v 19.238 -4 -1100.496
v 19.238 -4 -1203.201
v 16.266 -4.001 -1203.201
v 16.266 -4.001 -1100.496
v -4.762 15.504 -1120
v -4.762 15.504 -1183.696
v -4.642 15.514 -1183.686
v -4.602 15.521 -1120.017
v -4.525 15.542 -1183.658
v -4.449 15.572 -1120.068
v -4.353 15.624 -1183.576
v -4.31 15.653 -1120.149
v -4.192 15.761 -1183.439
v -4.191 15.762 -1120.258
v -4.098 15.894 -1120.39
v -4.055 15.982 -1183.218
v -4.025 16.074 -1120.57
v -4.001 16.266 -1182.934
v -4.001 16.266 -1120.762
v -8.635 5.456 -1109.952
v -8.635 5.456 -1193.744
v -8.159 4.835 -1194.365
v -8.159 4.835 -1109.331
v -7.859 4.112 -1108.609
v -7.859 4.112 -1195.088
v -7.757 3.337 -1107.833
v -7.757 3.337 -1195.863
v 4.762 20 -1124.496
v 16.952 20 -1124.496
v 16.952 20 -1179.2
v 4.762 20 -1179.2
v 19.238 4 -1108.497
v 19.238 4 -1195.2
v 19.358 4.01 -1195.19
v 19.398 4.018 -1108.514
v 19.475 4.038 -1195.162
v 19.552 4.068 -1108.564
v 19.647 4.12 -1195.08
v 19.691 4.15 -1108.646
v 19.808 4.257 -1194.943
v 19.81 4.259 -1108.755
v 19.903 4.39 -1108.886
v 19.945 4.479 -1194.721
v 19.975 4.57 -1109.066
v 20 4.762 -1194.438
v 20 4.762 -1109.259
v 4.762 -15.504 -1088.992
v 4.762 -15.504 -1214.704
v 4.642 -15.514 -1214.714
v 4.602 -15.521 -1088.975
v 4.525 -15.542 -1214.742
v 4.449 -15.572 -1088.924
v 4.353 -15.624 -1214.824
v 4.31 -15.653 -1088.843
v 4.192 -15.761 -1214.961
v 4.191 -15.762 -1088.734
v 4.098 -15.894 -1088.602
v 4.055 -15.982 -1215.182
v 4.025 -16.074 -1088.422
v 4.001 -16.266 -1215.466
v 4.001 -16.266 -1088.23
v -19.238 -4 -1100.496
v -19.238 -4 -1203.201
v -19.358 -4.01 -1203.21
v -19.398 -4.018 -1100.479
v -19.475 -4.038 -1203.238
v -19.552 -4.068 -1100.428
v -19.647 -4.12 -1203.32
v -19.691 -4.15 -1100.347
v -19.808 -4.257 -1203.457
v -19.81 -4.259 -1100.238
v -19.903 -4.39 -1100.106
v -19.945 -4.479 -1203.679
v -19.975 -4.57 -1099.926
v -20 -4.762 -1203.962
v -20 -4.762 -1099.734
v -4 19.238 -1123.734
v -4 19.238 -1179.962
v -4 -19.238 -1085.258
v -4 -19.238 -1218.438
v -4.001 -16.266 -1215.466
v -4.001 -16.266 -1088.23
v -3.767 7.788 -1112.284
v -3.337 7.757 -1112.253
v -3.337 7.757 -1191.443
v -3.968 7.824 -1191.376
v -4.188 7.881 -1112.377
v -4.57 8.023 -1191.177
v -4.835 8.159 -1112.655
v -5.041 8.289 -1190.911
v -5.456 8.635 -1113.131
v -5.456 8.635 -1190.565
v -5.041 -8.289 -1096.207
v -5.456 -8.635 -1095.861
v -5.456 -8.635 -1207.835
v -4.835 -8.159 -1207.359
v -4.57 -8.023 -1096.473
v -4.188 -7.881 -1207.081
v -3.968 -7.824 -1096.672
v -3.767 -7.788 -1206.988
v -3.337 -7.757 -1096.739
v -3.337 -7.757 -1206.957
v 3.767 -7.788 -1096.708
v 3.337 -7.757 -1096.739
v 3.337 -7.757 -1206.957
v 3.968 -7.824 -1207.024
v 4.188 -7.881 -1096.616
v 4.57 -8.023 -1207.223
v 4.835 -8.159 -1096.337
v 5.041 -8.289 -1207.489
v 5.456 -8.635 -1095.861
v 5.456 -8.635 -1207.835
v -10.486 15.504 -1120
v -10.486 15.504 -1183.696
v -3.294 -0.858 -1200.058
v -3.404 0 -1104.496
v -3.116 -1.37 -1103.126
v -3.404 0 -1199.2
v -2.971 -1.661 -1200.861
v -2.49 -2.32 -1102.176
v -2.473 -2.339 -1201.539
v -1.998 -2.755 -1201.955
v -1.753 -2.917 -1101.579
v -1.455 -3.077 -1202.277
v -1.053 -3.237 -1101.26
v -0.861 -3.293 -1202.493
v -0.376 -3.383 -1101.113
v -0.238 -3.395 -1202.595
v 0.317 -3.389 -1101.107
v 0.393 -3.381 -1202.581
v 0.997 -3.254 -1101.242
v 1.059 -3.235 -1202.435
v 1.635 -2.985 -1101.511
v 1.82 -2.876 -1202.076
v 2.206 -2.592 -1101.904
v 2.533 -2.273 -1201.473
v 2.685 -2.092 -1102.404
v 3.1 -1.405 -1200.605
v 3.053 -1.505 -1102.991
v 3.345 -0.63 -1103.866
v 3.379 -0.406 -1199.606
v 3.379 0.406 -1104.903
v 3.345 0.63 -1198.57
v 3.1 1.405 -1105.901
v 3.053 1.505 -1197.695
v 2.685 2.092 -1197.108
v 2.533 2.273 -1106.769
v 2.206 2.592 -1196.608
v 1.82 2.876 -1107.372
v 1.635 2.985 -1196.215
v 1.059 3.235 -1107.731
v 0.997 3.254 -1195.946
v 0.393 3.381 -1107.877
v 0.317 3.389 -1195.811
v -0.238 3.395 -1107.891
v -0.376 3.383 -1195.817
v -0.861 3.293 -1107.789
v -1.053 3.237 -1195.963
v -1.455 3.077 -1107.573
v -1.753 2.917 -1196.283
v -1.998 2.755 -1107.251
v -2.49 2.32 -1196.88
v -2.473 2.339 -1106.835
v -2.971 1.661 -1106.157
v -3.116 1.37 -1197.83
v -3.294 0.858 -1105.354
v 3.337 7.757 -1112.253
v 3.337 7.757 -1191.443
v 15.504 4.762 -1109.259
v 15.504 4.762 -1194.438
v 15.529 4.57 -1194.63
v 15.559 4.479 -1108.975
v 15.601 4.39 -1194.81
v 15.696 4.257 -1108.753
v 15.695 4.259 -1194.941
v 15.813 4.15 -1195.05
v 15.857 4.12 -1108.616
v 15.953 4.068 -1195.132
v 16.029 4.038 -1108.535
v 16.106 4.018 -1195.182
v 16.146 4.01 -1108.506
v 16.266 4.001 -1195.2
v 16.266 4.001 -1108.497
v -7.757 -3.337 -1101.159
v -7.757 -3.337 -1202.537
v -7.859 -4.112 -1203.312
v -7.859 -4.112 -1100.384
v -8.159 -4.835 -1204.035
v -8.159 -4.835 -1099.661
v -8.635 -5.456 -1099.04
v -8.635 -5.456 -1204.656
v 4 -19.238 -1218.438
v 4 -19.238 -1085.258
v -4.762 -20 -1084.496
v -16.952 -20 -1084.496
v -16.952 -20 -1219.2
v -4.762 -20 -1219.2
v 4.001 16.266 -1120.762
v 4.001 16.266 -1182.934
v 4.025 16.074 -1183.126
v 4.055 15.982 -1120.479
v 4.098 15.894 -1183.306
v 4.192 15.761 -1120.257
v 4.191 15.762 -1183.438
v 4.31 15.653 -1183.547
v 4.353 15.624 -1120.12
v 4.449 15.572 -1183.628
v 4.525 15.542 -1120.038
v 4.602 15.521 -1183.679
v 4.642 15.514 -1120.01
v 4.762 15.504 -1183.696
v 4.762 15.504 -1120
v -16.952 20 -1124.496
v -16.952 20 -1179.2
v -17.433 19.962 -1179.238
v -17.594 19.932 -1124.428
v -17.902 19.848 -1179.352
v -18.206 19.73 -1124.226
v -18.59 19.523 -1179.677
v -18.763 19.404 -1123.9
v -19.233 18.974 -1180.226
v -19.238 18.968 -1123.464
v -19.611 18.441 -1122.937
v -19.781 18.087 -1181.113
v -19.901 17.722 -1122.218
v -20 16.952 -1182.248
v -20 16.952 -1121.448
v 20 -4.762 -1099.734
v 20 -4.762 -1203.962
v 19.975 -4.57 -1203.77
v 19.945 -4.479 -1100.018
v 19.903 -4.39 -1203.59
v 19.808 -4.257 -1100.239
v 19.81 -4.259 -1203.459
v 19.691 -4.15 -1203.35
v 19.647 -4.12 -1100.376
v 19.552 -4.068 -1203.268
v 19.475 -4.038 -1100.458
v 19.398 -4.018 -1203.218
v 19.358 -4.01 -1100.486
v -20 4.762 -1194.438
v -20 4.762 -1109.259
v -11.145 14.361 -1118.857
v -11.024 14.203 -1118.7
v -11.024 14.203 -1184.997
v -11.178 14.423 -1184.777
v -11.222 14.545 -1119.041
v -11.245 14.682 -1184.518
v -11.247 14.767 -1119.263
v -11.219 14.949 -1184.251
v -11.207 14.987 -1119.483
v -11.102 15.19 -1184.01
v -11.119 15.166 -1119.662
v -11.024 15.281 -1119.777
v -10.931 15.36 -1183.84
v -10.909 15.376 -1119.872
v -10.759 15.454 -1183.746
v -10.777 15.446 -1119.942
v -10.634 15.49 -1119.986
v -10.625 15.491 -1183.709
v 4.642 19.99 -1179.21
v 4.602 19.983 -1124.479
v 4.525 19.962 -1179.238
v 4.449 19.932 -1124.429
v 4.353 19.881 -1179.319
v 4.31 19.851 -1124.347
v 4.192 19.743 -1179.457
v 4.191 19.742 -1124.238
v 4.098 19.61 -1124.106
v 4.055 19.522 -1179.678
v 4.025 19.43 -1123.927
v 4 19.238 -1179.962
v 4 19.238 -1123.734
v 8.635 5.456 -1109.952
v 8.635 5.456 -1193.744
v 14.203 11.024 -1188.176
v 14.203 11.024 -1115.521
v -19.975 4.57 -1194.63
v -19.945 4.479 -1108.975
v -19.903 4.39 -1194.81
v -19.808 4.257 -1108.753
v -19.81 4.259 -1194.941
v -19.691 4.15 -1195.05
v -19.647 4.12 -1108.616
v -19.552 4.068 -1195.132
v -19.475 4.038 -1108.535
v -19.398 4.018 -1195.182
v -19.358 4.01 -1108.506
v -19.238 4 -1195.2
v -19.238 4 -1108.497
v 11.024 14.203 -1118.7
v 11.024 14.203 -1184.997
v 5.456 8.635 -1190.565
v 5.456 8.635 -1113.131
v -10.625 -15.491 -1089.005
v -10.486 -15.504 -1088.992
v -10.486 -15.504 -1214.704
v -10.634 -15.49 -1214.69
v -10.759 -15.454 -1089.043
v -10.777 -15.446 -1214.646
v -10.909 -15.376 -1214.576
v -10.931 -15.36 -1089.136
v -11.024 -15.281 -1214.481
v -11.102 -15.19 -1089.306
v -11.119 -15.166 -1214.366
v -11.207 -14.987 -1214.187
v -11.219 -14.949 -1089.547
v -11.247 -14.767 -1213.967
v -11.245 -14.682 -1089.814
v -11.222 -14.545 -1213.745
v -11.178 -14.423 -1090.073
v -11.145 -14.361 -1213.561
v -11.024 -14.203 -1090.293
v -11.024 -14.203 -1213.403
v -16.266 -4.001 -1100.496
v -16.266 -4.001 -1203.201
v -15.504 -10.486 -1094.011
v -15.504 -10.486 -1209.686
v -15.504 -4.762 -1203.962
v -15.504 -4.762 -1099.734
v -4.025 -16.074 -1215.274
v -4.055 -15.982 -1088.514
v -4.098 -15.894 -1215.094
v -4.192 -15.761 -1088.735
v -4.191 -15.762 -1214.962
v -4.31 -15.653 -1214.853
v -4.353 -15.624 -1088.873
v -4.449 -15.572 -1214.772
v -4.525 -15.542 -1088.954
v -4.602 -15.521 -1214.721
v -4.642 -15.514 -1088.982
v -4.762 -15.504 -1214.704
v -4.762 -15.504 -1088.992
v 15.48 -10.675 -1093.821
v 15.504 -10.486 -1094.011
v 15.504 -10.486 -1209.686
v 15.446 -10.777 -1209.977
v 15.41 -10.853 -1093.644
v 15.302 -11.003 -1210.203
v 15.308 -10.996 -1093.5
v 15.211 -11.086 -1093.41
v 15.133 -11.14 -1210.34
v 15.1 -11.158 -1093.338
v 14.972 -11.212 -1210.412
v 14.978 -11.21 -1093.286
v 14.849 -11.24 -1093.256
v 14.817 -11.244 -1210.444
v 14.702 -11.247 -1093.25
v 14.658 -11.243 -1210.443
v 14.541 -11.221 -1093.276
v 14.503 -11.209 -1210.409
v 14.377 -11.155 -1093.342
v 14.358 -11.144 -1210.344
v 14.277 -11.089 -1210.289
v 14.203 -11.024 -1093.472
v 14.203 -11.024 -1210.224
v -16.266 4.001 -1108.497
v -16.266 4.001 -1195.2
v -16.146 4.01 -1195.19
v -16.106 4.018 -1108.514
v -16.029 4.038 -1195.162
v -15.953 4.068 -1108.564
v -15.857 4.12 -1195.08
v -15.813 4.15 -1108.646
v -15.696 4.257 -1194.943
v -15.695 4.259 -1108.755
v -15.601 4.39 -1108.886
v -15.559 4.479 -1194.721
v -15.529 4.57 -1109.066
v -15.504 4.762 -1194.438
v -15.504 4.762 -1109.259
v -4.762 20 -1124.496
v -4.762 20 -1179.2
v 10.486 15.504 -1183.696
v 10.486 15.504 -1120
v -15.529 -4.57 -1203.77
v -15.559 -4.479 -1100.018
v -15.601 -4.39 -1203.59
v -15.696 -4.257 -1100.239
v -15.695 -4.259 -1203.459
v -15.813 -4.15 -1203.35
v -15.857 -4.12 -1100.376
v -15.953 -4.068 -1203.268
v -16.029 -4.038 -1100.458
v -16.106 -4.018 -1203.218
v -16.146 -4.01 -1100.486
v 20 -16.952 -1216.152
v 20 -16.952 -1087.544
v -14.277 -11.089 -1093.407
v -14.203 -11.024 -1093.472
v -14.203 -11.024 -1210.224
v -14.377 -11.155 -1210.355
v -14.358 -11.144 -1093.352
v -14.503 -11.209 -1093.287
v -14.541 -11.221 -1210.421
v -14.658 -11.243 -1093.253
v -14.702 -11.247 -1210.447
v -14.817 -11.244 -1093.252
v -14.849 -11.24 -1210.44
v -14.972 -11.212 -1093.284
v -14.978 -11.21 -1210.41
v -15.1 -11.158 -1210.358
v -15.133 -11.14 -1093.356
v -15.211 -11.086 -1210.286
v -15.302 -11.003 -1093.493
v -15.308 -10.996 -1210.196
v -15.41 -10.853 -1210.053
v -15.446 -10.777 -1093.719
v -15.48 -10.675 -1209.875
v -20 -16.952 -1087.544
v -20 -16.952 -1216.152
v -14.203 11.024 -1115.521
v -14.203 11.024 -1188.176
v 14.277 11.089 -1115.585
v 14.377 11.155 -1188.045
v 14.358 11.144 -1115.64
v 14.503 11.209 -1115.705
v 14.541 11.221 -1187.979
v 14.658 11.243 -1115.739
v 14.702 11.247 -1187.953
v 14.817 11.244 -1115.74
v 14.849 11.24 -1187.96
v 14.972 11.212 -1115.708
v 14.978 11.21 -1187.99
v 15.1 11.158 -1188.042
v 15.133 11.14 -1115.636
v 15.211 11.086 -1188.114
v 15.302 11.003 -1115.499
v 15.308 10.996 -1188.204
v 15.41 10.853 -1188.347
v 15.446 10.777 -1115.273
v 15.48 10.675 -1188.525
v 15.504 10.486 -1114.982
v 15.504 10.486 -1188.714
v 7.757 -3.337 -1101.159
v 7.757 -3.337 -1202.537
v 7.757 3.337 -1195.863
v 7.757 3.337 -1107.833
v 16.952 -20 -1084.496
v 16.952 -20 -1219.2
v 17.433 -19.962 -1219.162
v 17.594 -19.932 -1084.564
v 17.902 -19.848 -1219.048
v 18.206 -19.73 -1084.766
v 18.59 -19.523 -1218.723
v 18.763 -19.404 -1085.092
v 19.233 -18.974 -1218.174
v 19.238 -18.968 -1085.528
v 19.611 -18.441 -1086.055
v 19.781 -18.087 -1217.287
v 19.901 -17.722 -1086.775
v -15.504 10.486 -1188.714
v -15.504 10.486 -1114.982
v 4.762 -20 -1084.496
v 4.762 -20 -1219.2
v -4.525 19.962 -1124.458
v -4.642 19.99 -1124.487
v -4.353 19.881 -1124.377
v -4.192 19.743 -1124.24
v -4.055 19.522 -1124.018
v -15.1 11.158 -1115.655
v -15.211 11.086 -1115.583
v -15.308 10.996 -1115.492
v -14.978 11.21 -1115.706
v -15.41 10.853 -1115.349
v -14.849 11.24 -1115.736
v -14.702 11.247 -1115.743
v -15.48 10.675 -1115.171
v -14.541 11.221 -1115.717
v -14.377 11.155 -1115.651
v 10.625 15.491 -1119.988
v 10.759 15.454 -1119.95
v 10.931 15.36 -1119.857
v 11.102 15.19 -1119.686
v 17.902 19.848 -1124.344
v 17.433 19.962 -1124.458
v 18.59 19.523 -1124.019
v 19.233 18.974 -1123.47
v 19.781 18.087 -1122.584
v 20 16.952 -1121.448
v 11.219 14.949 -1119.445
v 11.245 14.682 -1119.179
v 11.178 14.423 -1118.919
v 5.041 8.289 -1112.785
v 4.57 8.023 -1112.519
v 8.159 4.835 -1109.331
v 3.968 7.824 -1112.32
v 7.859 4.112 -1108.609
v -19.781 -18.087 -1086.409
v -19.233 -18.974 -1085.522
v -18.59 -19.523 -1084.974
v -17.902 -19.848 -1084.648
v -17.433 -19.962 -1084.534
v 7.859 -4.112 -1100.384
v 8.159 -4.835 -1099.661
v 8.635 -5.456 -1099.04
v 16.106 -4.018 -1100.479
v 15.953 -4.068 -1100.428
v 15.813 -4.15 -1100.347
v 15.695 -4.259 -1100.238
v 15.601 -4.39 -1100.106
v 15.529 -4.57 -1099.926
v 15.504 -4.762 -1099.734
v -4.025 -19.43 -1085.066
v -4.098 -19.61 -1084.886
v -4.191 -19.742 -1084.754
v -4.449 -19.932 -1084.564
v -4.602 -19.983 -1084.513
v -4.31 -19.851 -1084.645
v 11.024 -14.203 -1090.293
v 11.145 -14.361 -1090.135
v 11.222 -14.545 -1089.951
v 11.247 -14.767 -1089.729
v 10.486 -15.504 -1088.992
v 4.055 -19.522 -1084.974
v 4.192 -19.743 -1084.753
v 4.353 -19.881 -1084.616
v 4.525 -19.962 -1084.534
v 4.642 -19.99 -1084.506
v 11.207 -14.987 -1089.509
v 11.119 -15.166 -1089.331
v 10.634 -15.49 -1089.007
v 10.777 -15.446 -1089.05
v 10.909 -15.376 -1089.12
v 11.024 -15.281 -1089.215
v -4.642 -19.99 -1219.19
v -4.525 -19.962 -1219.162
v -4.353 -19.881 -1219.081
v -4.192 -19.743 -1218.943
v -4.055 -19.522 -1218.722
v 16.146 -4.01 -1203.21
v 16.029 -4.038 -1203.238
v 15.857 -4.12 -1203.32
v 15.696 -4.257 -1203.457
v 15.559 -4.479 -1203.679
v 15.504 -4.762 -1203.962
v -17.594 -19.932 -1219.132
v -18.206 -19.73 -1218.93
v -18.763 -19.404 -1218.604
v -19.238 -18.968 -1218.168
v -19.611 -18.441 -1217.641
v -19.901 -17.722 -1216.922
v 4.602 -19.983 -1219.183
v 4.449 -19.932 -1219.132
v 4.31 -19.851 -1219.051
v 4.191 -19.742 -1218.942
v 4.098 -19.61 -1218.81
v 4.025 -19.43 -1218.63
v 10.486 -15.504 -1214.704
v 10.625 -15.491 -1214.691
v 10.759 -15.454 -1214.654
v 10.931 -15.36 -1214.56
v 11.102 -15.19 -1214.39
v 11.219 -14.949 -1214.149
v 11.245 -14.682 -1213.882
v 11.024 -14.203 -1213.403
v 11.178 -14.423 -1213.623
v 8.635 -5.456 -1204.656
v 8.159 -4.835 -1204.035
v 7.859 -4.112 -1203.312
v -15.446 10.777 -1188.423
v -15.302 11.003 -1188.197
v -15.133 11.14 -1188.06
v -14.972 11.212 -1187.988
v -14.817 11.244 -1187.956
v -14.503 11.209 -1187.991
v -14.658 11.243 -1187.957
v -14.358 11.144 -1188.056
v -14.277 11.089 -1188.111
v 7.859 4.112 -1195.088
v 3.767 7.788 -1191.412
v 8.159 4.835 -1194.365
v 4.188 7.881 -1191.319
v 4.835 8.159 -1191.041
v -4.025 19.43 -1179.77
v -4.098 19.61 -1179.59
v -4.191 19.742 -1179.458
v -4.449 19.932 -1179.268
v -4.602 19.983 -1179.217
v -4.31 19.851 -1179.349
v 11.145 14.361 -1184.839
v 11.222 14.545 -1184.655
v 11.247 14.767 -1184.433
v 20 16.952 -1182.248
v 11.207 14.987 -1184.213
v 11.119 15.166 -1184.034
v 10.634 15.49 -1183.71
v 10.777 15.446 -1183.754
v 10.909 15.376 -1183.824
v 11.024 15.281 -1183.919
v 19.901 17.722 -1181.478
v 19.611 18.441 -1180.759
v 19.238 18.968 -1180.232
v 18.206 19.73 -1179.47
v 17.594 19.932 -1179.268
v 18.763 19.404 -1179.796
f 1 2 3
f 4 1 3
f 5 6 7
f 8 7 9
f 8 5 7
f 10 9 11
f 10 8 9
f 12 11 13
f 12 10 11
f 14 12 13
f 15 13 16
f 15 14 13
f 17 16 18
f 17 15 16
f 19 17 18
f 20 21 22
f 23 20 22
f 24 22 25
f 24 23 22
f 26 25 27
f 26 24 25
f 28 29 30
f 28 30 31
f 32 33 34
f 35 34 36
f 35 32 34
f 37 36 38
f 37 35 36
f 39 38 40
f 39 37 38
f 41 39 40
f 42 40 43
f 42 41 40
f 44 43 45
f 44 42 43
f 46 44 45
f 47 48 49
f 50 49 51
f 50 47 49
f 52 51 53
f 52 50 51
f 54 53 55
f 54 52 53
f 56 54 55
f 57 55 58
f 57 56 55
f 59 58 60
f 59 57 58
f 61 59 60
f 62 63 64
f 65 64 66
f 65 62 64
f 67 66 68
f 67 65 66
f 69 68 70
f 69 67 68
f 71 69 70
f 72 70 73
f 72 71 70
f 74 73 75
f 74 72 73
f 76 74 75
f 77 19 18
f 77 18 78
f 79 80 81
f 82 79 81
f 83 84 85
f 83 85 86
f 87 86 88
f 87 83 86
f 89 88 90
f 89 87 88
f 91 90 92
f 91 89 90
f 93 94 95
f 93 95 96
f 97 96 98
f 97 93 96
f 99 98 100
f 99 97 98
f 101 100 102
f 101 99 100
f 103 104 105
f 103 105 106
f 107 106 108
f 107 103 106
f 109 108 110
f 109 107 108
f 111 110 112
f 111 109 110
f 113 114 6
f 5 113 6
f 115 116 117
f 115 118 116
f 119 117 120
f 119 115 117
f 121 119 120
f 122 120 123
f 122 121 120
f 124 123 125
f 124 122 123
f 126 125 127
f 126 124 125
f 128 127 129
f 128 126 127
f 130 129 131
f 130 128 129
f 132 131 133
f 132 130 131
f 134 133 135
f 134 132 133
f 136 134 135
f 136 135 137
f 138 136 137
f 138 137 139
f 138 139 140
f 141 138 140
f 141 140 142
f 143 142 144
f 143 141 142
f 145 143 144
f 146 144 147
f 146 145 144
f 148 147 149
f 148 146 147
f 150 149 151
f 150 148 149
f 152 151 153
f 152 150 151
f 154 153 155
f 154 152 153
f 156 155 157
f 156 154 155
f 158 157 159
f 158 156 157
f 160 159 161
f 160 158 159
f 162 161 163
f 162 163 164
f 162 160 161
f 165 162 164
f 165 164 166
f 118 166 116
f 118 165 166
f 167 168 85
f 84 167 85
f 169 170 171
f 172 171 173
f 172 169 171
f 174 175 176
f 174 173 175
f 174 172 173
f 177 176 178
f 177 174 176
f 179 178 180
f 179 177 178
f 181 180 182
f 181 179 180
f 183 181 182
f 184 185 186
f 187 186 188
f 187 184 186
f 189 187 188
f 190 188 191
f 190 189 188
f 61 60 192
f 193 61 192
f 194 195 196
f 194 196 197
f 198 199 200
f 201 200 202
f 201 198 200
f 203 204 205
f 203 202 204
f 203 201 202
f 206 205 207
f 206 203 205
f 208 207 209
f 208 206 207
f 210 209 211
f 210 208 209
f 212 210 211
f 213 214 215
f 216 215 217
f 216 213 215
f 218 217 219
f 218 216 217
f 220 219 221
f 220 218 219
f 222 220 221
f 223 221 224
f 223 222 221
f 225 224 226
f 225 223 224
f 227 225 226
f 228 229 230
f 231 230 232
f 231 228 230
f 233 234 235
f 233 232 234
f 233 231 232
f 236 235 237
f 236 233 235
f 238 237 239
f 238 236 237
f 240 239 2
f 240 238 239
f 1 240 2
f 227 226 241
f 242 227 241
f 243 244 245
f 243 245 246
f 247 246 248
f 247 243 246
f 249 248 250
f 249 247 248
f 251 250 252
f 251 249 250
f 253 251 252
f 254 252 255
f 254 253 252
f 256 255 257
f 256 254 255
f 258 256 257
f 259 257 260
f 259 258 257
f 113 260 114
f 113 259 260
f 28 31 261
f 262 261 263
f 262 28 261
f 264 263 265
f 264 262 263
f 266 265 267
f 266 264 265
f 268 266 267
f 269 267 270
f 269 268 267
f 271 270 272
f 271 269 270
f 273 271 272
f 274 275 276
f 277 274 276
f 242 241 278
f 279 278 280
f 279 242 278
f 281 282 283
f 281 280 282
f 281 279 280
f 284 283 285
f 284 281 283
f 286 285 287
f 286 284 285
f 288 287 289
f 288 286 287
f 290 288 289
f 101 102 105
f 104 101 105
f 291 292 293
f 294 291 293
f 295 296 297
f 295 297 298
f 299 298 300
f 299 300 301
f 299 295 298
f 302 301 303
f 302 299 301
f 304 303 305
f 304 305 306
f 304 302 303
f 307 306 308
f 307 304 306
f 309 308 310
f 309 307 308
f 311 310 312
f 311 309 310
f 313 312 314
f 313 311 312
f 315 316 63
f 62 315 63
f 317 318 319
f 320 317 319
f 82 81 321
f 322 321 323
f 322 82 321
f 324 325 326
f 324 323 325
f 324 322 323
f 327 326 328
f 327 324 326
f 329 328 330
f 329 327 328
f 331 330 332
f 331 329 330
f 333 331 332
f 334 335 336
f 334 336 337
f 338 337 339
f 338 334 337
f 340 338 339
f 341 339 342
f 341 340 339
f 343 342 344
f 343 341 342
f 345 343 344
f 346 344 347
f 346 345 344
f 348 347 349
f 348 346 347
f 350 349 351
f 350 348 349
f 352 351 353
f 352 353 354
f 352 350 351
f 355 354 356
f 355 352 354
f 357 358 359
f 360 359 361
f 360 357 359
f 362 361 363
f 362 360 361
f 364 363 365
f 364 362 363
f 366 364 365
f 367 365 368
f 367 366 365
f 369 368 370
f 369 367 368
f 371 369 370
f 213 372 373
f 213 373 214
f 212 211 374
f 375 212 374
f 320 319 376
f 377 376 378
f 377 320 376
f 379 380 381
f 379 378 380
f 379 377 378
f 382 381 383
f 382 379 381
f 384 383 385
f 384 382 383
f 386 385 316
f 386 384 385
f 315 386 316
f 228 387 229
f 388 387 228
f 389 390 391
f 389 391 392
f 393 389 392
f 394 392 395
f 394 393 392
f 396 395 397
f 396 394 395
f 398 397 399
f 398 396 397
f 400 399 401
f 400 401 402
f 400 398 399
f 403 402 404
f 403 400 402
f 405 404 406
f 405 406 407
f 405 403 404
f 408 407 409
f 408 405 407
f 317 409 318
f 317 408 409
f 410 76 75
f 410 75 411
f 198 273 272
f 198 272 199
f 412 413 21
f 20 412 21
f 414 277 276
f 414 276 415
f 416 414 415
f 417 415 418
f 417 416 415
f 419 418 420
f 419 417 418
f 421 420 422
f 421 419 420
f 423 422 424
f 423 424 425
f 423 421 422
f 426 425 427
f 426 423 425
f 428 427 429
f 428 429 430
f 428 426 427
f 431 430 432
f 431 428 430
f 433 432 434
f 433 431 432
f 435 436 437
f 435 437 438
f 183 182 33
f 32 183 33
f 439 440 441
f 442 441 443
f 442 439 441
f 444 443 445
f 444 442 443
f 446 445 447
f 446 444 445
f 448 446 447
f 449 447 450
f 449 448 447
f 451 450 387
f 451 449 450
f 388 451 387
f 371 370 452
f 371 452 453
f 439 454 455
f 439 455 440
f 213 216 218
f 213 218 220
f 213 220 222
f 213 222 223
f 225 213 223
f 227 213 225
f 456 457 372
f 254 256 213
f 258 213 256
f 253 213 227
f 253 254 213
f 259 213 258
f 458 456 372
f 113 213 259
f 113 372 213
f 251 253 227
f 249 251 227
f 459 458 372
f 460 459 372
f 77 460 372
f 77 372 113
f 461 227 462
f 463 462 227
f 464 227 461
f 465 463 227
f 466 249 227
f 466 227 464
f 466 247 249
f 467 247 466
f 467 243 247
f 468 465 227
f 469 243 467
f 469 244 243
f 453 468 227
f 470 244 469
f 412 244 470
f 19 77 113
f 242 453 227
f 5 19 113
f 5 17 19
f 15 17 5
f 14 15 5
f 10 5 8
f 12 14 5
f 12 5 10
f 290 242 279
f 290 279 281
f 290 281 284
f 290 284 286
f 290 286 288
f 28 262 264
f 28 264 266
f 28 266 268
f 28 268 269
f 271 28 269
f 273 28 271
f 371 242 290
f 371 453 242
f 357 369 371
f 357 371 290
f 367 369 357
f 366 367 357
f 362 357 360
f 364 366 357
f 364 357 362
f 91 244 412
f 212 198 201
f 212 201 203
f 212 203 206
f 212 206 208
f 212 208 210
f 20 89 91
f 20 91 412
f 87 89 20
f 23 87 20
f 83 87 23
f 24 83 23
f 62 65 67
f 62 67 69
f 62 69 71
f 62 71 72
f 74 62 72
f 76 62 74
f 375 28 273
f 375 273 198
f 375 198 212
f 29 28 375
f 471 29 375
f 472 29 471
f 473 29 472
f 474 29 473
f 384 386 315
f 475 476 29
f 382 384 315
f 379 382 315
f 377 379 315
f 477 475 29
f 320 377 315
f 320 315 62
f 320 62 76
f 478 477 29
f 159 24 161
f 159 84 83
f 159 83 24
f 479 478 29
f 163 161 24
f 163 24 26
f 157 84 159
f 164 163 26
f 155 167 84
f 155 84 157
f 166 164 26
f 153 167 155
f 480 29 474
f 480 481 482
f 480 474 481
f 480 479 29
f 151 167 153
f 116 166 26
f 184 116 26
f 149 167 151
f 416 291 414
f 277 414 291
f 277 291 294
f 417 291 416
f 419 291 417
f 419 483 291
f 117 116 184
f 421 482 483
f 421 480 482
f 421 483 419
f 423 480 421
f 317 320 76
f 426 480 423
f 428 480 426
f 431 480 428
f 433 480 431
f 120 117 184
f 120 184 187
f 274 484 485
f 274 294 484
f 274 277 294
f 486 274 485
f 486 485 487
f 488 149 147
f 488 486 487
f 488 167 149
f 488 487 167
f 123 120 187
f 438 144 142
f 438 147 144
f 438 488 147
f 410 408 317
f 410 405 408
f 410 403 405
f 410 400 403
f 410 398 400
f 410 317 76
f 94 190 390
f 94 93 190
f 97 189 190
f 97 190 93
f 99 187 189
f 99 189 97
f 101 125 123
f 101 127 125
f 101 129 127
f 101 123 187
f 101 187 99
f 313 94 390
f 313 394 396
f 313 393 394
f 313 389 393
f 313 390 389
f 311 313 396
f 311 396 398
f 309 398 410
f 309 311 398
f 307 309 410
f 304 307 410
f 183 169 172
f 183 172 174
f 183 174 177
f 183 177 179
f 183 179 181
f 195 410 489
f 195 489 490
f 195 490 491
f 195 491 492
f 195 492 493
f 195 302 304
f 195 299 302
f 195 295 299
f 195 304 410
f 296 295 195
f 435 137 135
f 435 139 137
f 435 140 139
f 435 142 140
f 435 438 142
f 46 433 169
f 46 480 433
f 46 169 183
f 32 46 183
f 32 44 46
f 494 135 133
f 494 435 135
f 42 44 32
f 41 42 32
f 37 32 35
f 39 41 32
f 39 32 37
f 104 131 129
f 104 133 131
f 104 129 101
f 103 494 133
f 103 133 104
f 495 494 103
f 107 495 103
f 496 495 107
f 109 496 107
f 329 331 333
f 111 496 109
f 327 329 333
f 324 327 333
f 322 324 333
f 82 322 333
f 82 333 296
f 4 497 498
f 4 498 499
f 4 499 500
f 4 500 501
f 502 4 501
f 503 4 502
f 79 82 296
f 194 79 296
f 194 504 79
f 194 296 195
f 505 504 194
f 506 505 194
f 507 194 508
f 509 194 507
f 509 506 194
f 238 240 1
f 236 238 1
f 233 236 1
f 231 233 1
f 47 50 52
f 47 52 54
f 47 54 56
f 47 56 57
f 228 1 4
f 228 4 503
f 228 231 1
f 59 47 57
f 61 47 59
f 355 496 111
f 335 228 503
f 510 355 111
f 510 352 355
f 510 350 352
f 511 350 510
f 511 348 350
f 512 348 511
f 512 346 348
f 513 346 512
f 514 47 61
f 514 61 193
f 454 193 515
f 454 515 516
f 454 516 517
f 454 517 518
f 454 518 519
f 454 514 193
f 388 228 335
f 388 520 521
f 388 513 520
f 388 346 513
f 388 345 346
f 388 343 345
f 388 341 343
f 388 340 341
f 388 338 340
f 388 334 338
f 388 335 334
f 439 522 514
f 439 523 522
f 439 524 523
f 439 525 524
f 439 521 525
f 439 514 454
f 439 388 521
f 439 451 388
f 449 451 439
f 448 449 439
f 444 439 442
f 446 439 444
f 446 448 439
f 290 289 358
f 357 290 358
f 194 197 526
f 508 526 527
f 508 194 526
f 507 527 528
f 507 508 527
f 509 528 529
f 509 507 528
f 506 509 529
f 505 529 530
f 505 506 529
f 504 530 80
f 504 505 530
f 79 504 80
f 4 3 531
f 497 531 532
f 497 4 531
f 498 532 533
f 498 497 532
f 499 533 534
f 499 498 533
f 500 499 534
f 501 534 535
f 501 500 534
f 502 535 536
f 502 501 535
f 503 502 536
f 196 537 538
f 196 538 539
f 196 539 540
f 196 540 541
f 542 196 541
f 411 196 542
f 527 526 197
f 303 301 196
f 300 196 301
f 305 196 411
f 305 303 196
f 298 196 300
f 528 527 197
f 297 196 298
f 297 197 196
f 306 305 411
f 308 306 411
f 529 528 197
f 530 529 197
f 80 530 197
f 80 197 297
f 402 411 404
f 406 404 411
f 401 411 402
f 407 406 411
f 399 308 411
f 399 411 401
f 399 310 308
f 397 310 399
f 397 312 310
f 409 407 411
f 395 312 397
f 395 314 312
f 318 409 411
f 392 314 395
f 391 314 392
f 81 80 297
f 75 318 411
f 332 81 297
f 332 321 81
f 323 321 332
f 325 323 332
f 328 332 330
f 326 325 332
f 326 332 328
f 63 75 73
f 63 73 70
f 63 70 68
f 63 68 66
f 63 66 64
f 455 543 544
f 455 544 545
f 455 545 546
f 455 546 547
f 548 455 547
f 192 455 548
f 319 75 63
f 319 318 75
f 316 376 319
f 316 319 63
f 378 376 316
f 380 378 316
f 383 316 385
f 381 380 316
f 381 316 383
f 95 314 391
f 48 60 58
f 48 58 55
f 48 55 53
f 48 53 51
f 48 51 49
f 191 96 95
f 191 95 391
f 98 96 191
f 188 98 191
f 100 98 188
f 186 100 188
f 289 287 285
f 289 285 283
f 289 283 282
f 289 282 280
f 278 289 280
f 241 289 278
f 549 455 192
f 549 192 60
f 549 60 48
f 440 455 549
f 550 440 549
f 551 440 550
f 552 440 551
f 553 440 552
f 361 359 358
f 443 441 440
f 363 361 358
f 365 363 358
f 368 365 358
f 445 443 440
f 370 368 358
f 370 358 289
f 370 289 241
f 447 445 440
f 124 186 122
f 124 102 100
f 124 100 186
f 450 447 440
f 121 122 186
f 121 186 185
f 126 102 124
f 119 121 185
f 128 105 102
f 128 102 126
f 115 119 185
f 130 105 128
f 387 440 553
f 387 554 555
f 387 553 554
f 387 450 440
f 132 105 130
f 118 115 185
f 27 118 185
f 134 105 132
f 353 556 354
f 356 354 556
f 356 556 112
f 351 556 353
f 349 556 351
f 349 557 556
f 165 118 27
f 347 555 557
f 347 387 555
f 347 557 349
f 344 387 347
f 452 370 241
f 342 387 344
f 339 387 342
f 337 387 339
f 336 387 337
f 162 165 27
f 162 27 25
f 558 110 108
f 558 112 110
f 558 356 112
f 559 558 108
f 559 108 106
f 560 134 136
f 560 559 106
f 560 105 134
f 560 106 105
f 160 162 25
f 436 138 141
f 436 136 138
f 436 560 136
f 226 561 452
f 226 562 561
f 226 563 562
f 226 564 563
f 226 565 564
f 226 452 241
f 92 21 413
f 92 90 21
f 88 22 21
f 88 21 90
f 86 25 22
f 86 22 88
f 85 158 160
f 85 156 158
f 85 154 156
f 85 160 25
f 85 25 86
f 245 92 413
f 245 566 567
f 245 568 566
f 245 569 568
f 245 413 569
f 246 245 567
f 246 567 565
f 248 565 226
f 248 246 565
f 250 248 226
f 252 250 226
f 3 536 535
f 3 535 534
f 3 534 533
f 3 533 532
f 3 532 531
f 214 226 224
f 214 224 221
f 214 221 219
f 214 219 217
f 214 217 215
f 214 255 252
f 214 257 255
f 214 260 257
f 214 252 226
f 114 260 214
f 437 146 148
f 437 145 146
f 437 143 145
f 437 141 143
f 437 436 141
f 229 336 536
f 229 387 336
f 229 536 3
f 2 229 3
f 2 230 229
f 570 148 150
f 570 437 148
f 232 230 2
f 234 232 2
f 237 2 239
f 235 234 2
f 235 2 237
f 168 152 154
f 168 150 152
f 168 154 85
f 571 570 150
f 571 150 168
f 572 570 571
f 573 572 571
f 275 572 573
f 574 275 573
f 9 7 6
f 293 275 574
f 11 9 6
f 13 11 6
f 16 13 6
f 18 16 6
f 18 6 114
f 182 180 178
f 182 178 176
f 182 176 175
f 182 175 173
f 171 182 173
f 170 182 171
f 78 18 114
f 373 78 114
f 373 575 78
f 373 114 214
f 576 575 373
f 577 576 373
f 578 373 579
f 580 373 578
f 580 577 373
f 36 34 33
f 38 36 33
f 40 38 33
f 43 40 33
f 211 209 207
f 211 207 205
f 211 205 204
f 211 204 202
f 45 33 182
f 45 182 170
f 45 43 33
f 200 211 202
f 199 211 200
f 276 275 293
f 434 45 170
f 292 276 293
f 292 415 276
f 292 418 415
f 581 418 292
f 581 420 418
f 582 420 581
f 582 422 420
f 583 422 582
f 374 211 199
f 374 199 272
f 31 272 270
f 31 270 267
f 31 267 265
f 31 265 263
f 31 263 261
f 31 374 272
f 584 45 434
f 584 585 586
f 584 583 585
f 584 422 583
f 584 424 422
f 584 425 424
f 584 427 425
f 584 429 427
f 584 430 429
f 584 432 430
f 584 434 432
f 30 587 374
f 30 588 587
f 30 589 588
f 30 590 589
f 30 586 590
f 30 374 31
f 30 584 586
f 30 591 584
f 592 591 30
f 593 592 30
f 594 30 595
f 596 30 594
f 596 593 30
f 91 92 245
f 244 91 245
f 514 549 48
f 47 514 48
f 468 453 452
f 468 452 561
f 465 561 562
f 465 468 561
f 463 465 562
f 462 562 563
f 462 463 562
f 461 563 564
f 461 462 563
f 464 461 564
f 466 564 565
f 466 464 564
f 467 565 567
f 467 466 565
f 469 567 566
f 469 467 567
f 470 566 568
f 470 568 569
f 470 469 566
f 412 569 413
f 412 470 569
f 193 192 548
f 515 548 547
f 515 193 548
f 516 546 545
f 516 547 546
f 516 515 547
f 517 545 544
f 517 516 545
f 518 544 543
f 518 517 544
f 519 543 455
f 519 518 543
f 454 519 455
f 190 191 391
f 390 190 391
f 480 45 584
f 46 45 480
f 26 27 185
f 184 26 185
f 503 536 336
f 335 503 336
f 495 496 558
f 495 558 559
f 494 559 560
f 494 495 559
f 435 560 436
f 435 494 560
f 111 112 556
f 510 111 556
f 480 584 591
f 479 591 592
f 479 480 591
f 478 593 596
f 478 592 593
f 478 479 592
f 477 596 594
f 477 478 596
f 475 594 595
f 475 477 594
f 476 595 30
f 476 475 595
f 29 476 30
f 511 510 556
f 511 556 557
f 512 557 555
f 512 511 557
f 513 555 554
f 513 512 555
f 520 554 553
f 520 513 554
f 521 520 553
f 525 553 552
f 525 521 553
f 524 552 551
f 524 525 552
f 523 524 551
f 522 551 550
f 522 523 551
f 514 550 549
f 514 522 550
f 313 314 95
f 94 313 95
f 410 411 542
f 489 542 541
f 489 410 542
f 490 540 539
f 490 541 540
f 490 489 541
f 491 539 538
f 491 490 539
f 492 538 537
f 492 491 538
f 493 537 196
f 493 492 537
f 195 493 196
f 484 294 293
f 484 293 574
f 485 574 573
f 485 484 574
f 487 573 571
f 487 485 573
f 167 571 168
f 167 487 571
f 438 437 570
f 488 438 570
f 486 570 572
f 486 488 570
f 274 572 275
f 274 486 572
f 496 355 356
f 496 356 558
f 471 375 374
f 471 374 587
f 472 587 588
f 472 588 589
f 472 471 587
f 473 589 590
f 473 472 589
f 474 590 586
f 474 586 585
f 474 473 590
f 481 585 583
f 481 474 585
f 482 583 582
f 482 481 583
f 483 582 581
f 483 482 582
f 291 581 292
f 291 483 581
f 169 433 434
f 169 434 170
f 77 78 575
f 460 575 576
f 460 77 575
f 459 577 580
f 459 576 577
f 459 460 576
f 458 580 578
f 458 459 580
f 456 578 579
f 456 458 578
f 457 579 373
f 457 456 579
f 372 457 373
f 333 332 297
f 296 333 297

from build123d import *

# Parameters (mm, degrees)
SKETCH1_R          = 3.4036
EXTRUDE1_DEPTH     = 1219.2
CUT_EXTRUDE1_DEPTH = 1221.019934263


with BuildPart() as part:
    # Sketch1 → Extrude1 (new, symmetric)
    with BuildSketch(Plane.XY):
        with BuildLine():
            Line((-20, 16.952), (-20, 4.7625))
            ThreePointArc((-20, 4.7625), (-19.776815367, 4.223684633), (-19.238, 4.0005))
            Line((-19.238, 4.0005), (-16.2662, 4.0005))
            ThreePointArc((-16.2662, 4.0005), (-15.727384633, 4.223684633), (-15.5042, 4.7625))
            Line((-15.5042, 4.7625), (-15.5042, 10.485558599))
            ThreePointArc((-15.5042, 10.485558599), (-15.033804775, 11.189554802), (-14.203384633, 11.024373966))
            Line((-14.203384633, 11.024373966), (-8.635059555, 5.456048889))
            ThreePointArc((-8.635059555, 5.456048889), (-7.985348265, 4.483687227), (-7.7572, 3.336708444))
            Line((-7.7572, 3.336708444), (-7.7572, -3.336708444))
            ThreePointArc((-7.7572, -3.336708444), (-7.985348265, -4.483687227), (-8.635059555, -5.456048889))
            Line((-8.635059555, -5.456048889), (-14.203384633, -11.024373966))
            ThreePointArc((-14.203384633, -11.024373966), (-15.033804775, -11.189554802), (-15.5042, -10.485558599))
            Line((-15.5042, -10.485558599), (-15.5042, -4.7625))
            ThreePointArc((-15.5042, -4.7625), (-15.727384633, -4.223684633), (-16.2662, -4.0005))
            Line((-16.2662, -4.0005), (-19.238, -4.0005))
            ThreePointArc((-19.238, -4.0005), (-19.776815367, -4.223684633), (-20, -4.7625))
            Line((-20, -4.7625), (-20, -16.952))
            ThreePointArc((-20, -16.952), (-19.107261469, -19.107261469), (-16.952, -20))
            Line((-16.952, -20), (-4.7625, -20))
            ThreePointArc((-4.7625, -20), (-4.223684633, -19.776815367), (-4.0005, -19.238))
            Line((-4.0005, -19.238), (-4.0005, -16.2662))
            ThreePointArc((-4.0005, -16.2662), (-4.223684633, -15.727384633), (-4.7625, -15.5042))
            Line((-4.7625, -15.5042), (-10.485558599, -15.5042))
            ThreePointArc((-10.485558599, -15.5042), (-11.189554802, -15.033804775), (-11.024373966, -14.203384633))
            Line((-11.024373966, -14.203384633), (-5.456048889, -8.635059555))
            ThreePointArc((-5.456048889, -8.635059555), (-4.483687227, -7.985348265), (-3.336708444, -7.7572))
            Line((-3.336708444, -7.7572), (3.336708444, -7.7572))
            ThreePointArc((3.336708444, -7.7572), (4.483687227, -7.985348265), (5.456048889, -8.635059555))
            Line((5.456048889, -8.635059555), (11.024373966, -14.203384633))
            ThreePointArc((11.024373966, -14.203384633), (11.189554802, -15.033804775), (10.485558599, -15.5042))
            Line((10.485558599, -15.5042), (4.7625, -15.5042))
            ThreePointArc((4.7625, -15.5042), (4.223684633, -15.727384633), (4.0005, -16.2662))
            Line((4.0005, -16.2662), (4.0005, -19.238))
            ThreePointArc((4.0005, -19.238), (4.223684633, -19.776815367), (4.7625, -20))
            Line((4.7625, -20), (16.952, -20))
            ThreePointArc((16.952, -20), (19.107261469, -19.107261469), (20, -16.952))
            Line((20, -16.952), (20, -4.7625))
            ThreePointArc((20, -4.7625), (19.776815367, -4.223684633), (19.238, -4.0005))
            Line((19.238, -4.0005), (16.2662, -4.0005))
            ThreePointArc((16.2662, -4.0005), (15.727384633, -4.223684633), (15.5042, -4.7625))
            Line((15.5042, -4.7625), (15.5042, -10.485558599))
            ThreePointArc((15.5042, -10.485558599), (15.033804775, -11.189554802), (14.203384633, -11.024373966))
            Line((14.203384633, -11.024373966), (8.635059555, -5.456048889))
            ThreePointArc((8.635059555, -5.456048889), (7.985348265, -4.483687227), (7.7572, -3.336708444))
            Line((7.7572, -3.336708444), (7.7572, 3.336708444))
            ThreePointArc((7.7572, 3.336708444), (7.985348265, 4.483687227), (8.635059555, 5.456048889))
            Line((8.635059555, 5.456048889), (14.203384633, 11.024373966))
            ThreePointArc((14.203384633, 11.024373966), (15.033804775, 11.189554802), (15.5042, 10.485558599))
            Line((15.5042, 10.485558599), (15.5042, 4.7625))
            ThreePointArc((15.5042, 4.7625), (15.727384633, 4.223684633), (16.2662, 4.0005))
            Line((16.2662, 4.0005), (19.238, 4.0005))
            ThreePointArc((19.238, 4.0005), (19.776815367, 4.223684633), (20, 4.7625))
            Line((20, 4.7625), (20, 16.952))
            ThreePointArc((20, 16.952), (19.107261469, 19.107261469), (16.952, 20))
            Line((16.952, 20), (4.7625, 20))
            ThreePointArc((4.7625, 20), (4.223684633, 19.776815367), (4.0005, 19.238))
            Line((4.0005, 19.238), (4.0005, 16.2662))
            ThreePointArc((4.0005, 16.2662), (4.223684633, 15.727384633), (4.7625, 15.5042))
            Line((4.7625, 15.5042), (10.485558599, 15.5042))
            ThreePointArc((10.485558599, 15.5042), (11.189554802, 15.033804775), (11.024373966, 14.203384633))
            Line((11.024373966, 14.203384633), (5.456048889, 8.635059555))
            ThreePointArc((5.456048889, 8.635059555), (4.483687227, 7.985348265), (3.336708444, 7.7572))
            Line((3.336708444, 7.7572), (-3.336708444, 7.7572))
            ThreePointArc((-3.336708444, 7.7572), (-4.483687227, 7.985348265), (-5.456048889, 8.635059555))
            Line((-5.456048889, 8.635059555), (-11.024373966, 14.203384633))
            ThreePointArc((-11.024373966, 14.203384633), (-11.189554802, 15.033804775), (-10.485558599, 15.5042))
            Line((-10.485558599, 15.5042), (-4.7625, 15.5042))
            ThreePointArc((-4.7625, 15.5042), (-4.223684633, 15.727384633), (-4.0005, 16.2662))
            Line((-4.0005, 16.2662), (-4.0005, 19.238))
            ThreePointArc((-4.0005, 19.238), (-4.223684633, 19.776815367), (-4.7625, 20))
            Line((-4.7625, 20), (-16.952, 20))
            ThreePointArc((-16.952, 20), (-19.107261469, 19.107261469), (-20, 16.952))
        make_face()
        with Locations(Location((0, 0, 0), (0, 0, 180))):
            Circle(SKETCH1_R, mode=Mode.SUBTRACT)
    extrude(amount=EXTRUDE1_DEPTH, both=True)

    # Sketch2 → Cut-Extrude1 (cut, through all)
    with BuildSketch(Plane(origin=(20, 0, 0), x_dir=(0, 0, -1), z_dir=(1, 0, 0))):
        Polygon((1219.2, -20), (1179.2, 20), (1219.2, 20), align=None)
        Polygon((1124.496158184, 20), (1084.496158184, -20), (-1219.2, -20), (-1219.2, 20), align=None)
    extrude(amount=-CUT_EXTRUDE1_DEPTH, mode=Mode.SUBTRACT)


solid = part.part
